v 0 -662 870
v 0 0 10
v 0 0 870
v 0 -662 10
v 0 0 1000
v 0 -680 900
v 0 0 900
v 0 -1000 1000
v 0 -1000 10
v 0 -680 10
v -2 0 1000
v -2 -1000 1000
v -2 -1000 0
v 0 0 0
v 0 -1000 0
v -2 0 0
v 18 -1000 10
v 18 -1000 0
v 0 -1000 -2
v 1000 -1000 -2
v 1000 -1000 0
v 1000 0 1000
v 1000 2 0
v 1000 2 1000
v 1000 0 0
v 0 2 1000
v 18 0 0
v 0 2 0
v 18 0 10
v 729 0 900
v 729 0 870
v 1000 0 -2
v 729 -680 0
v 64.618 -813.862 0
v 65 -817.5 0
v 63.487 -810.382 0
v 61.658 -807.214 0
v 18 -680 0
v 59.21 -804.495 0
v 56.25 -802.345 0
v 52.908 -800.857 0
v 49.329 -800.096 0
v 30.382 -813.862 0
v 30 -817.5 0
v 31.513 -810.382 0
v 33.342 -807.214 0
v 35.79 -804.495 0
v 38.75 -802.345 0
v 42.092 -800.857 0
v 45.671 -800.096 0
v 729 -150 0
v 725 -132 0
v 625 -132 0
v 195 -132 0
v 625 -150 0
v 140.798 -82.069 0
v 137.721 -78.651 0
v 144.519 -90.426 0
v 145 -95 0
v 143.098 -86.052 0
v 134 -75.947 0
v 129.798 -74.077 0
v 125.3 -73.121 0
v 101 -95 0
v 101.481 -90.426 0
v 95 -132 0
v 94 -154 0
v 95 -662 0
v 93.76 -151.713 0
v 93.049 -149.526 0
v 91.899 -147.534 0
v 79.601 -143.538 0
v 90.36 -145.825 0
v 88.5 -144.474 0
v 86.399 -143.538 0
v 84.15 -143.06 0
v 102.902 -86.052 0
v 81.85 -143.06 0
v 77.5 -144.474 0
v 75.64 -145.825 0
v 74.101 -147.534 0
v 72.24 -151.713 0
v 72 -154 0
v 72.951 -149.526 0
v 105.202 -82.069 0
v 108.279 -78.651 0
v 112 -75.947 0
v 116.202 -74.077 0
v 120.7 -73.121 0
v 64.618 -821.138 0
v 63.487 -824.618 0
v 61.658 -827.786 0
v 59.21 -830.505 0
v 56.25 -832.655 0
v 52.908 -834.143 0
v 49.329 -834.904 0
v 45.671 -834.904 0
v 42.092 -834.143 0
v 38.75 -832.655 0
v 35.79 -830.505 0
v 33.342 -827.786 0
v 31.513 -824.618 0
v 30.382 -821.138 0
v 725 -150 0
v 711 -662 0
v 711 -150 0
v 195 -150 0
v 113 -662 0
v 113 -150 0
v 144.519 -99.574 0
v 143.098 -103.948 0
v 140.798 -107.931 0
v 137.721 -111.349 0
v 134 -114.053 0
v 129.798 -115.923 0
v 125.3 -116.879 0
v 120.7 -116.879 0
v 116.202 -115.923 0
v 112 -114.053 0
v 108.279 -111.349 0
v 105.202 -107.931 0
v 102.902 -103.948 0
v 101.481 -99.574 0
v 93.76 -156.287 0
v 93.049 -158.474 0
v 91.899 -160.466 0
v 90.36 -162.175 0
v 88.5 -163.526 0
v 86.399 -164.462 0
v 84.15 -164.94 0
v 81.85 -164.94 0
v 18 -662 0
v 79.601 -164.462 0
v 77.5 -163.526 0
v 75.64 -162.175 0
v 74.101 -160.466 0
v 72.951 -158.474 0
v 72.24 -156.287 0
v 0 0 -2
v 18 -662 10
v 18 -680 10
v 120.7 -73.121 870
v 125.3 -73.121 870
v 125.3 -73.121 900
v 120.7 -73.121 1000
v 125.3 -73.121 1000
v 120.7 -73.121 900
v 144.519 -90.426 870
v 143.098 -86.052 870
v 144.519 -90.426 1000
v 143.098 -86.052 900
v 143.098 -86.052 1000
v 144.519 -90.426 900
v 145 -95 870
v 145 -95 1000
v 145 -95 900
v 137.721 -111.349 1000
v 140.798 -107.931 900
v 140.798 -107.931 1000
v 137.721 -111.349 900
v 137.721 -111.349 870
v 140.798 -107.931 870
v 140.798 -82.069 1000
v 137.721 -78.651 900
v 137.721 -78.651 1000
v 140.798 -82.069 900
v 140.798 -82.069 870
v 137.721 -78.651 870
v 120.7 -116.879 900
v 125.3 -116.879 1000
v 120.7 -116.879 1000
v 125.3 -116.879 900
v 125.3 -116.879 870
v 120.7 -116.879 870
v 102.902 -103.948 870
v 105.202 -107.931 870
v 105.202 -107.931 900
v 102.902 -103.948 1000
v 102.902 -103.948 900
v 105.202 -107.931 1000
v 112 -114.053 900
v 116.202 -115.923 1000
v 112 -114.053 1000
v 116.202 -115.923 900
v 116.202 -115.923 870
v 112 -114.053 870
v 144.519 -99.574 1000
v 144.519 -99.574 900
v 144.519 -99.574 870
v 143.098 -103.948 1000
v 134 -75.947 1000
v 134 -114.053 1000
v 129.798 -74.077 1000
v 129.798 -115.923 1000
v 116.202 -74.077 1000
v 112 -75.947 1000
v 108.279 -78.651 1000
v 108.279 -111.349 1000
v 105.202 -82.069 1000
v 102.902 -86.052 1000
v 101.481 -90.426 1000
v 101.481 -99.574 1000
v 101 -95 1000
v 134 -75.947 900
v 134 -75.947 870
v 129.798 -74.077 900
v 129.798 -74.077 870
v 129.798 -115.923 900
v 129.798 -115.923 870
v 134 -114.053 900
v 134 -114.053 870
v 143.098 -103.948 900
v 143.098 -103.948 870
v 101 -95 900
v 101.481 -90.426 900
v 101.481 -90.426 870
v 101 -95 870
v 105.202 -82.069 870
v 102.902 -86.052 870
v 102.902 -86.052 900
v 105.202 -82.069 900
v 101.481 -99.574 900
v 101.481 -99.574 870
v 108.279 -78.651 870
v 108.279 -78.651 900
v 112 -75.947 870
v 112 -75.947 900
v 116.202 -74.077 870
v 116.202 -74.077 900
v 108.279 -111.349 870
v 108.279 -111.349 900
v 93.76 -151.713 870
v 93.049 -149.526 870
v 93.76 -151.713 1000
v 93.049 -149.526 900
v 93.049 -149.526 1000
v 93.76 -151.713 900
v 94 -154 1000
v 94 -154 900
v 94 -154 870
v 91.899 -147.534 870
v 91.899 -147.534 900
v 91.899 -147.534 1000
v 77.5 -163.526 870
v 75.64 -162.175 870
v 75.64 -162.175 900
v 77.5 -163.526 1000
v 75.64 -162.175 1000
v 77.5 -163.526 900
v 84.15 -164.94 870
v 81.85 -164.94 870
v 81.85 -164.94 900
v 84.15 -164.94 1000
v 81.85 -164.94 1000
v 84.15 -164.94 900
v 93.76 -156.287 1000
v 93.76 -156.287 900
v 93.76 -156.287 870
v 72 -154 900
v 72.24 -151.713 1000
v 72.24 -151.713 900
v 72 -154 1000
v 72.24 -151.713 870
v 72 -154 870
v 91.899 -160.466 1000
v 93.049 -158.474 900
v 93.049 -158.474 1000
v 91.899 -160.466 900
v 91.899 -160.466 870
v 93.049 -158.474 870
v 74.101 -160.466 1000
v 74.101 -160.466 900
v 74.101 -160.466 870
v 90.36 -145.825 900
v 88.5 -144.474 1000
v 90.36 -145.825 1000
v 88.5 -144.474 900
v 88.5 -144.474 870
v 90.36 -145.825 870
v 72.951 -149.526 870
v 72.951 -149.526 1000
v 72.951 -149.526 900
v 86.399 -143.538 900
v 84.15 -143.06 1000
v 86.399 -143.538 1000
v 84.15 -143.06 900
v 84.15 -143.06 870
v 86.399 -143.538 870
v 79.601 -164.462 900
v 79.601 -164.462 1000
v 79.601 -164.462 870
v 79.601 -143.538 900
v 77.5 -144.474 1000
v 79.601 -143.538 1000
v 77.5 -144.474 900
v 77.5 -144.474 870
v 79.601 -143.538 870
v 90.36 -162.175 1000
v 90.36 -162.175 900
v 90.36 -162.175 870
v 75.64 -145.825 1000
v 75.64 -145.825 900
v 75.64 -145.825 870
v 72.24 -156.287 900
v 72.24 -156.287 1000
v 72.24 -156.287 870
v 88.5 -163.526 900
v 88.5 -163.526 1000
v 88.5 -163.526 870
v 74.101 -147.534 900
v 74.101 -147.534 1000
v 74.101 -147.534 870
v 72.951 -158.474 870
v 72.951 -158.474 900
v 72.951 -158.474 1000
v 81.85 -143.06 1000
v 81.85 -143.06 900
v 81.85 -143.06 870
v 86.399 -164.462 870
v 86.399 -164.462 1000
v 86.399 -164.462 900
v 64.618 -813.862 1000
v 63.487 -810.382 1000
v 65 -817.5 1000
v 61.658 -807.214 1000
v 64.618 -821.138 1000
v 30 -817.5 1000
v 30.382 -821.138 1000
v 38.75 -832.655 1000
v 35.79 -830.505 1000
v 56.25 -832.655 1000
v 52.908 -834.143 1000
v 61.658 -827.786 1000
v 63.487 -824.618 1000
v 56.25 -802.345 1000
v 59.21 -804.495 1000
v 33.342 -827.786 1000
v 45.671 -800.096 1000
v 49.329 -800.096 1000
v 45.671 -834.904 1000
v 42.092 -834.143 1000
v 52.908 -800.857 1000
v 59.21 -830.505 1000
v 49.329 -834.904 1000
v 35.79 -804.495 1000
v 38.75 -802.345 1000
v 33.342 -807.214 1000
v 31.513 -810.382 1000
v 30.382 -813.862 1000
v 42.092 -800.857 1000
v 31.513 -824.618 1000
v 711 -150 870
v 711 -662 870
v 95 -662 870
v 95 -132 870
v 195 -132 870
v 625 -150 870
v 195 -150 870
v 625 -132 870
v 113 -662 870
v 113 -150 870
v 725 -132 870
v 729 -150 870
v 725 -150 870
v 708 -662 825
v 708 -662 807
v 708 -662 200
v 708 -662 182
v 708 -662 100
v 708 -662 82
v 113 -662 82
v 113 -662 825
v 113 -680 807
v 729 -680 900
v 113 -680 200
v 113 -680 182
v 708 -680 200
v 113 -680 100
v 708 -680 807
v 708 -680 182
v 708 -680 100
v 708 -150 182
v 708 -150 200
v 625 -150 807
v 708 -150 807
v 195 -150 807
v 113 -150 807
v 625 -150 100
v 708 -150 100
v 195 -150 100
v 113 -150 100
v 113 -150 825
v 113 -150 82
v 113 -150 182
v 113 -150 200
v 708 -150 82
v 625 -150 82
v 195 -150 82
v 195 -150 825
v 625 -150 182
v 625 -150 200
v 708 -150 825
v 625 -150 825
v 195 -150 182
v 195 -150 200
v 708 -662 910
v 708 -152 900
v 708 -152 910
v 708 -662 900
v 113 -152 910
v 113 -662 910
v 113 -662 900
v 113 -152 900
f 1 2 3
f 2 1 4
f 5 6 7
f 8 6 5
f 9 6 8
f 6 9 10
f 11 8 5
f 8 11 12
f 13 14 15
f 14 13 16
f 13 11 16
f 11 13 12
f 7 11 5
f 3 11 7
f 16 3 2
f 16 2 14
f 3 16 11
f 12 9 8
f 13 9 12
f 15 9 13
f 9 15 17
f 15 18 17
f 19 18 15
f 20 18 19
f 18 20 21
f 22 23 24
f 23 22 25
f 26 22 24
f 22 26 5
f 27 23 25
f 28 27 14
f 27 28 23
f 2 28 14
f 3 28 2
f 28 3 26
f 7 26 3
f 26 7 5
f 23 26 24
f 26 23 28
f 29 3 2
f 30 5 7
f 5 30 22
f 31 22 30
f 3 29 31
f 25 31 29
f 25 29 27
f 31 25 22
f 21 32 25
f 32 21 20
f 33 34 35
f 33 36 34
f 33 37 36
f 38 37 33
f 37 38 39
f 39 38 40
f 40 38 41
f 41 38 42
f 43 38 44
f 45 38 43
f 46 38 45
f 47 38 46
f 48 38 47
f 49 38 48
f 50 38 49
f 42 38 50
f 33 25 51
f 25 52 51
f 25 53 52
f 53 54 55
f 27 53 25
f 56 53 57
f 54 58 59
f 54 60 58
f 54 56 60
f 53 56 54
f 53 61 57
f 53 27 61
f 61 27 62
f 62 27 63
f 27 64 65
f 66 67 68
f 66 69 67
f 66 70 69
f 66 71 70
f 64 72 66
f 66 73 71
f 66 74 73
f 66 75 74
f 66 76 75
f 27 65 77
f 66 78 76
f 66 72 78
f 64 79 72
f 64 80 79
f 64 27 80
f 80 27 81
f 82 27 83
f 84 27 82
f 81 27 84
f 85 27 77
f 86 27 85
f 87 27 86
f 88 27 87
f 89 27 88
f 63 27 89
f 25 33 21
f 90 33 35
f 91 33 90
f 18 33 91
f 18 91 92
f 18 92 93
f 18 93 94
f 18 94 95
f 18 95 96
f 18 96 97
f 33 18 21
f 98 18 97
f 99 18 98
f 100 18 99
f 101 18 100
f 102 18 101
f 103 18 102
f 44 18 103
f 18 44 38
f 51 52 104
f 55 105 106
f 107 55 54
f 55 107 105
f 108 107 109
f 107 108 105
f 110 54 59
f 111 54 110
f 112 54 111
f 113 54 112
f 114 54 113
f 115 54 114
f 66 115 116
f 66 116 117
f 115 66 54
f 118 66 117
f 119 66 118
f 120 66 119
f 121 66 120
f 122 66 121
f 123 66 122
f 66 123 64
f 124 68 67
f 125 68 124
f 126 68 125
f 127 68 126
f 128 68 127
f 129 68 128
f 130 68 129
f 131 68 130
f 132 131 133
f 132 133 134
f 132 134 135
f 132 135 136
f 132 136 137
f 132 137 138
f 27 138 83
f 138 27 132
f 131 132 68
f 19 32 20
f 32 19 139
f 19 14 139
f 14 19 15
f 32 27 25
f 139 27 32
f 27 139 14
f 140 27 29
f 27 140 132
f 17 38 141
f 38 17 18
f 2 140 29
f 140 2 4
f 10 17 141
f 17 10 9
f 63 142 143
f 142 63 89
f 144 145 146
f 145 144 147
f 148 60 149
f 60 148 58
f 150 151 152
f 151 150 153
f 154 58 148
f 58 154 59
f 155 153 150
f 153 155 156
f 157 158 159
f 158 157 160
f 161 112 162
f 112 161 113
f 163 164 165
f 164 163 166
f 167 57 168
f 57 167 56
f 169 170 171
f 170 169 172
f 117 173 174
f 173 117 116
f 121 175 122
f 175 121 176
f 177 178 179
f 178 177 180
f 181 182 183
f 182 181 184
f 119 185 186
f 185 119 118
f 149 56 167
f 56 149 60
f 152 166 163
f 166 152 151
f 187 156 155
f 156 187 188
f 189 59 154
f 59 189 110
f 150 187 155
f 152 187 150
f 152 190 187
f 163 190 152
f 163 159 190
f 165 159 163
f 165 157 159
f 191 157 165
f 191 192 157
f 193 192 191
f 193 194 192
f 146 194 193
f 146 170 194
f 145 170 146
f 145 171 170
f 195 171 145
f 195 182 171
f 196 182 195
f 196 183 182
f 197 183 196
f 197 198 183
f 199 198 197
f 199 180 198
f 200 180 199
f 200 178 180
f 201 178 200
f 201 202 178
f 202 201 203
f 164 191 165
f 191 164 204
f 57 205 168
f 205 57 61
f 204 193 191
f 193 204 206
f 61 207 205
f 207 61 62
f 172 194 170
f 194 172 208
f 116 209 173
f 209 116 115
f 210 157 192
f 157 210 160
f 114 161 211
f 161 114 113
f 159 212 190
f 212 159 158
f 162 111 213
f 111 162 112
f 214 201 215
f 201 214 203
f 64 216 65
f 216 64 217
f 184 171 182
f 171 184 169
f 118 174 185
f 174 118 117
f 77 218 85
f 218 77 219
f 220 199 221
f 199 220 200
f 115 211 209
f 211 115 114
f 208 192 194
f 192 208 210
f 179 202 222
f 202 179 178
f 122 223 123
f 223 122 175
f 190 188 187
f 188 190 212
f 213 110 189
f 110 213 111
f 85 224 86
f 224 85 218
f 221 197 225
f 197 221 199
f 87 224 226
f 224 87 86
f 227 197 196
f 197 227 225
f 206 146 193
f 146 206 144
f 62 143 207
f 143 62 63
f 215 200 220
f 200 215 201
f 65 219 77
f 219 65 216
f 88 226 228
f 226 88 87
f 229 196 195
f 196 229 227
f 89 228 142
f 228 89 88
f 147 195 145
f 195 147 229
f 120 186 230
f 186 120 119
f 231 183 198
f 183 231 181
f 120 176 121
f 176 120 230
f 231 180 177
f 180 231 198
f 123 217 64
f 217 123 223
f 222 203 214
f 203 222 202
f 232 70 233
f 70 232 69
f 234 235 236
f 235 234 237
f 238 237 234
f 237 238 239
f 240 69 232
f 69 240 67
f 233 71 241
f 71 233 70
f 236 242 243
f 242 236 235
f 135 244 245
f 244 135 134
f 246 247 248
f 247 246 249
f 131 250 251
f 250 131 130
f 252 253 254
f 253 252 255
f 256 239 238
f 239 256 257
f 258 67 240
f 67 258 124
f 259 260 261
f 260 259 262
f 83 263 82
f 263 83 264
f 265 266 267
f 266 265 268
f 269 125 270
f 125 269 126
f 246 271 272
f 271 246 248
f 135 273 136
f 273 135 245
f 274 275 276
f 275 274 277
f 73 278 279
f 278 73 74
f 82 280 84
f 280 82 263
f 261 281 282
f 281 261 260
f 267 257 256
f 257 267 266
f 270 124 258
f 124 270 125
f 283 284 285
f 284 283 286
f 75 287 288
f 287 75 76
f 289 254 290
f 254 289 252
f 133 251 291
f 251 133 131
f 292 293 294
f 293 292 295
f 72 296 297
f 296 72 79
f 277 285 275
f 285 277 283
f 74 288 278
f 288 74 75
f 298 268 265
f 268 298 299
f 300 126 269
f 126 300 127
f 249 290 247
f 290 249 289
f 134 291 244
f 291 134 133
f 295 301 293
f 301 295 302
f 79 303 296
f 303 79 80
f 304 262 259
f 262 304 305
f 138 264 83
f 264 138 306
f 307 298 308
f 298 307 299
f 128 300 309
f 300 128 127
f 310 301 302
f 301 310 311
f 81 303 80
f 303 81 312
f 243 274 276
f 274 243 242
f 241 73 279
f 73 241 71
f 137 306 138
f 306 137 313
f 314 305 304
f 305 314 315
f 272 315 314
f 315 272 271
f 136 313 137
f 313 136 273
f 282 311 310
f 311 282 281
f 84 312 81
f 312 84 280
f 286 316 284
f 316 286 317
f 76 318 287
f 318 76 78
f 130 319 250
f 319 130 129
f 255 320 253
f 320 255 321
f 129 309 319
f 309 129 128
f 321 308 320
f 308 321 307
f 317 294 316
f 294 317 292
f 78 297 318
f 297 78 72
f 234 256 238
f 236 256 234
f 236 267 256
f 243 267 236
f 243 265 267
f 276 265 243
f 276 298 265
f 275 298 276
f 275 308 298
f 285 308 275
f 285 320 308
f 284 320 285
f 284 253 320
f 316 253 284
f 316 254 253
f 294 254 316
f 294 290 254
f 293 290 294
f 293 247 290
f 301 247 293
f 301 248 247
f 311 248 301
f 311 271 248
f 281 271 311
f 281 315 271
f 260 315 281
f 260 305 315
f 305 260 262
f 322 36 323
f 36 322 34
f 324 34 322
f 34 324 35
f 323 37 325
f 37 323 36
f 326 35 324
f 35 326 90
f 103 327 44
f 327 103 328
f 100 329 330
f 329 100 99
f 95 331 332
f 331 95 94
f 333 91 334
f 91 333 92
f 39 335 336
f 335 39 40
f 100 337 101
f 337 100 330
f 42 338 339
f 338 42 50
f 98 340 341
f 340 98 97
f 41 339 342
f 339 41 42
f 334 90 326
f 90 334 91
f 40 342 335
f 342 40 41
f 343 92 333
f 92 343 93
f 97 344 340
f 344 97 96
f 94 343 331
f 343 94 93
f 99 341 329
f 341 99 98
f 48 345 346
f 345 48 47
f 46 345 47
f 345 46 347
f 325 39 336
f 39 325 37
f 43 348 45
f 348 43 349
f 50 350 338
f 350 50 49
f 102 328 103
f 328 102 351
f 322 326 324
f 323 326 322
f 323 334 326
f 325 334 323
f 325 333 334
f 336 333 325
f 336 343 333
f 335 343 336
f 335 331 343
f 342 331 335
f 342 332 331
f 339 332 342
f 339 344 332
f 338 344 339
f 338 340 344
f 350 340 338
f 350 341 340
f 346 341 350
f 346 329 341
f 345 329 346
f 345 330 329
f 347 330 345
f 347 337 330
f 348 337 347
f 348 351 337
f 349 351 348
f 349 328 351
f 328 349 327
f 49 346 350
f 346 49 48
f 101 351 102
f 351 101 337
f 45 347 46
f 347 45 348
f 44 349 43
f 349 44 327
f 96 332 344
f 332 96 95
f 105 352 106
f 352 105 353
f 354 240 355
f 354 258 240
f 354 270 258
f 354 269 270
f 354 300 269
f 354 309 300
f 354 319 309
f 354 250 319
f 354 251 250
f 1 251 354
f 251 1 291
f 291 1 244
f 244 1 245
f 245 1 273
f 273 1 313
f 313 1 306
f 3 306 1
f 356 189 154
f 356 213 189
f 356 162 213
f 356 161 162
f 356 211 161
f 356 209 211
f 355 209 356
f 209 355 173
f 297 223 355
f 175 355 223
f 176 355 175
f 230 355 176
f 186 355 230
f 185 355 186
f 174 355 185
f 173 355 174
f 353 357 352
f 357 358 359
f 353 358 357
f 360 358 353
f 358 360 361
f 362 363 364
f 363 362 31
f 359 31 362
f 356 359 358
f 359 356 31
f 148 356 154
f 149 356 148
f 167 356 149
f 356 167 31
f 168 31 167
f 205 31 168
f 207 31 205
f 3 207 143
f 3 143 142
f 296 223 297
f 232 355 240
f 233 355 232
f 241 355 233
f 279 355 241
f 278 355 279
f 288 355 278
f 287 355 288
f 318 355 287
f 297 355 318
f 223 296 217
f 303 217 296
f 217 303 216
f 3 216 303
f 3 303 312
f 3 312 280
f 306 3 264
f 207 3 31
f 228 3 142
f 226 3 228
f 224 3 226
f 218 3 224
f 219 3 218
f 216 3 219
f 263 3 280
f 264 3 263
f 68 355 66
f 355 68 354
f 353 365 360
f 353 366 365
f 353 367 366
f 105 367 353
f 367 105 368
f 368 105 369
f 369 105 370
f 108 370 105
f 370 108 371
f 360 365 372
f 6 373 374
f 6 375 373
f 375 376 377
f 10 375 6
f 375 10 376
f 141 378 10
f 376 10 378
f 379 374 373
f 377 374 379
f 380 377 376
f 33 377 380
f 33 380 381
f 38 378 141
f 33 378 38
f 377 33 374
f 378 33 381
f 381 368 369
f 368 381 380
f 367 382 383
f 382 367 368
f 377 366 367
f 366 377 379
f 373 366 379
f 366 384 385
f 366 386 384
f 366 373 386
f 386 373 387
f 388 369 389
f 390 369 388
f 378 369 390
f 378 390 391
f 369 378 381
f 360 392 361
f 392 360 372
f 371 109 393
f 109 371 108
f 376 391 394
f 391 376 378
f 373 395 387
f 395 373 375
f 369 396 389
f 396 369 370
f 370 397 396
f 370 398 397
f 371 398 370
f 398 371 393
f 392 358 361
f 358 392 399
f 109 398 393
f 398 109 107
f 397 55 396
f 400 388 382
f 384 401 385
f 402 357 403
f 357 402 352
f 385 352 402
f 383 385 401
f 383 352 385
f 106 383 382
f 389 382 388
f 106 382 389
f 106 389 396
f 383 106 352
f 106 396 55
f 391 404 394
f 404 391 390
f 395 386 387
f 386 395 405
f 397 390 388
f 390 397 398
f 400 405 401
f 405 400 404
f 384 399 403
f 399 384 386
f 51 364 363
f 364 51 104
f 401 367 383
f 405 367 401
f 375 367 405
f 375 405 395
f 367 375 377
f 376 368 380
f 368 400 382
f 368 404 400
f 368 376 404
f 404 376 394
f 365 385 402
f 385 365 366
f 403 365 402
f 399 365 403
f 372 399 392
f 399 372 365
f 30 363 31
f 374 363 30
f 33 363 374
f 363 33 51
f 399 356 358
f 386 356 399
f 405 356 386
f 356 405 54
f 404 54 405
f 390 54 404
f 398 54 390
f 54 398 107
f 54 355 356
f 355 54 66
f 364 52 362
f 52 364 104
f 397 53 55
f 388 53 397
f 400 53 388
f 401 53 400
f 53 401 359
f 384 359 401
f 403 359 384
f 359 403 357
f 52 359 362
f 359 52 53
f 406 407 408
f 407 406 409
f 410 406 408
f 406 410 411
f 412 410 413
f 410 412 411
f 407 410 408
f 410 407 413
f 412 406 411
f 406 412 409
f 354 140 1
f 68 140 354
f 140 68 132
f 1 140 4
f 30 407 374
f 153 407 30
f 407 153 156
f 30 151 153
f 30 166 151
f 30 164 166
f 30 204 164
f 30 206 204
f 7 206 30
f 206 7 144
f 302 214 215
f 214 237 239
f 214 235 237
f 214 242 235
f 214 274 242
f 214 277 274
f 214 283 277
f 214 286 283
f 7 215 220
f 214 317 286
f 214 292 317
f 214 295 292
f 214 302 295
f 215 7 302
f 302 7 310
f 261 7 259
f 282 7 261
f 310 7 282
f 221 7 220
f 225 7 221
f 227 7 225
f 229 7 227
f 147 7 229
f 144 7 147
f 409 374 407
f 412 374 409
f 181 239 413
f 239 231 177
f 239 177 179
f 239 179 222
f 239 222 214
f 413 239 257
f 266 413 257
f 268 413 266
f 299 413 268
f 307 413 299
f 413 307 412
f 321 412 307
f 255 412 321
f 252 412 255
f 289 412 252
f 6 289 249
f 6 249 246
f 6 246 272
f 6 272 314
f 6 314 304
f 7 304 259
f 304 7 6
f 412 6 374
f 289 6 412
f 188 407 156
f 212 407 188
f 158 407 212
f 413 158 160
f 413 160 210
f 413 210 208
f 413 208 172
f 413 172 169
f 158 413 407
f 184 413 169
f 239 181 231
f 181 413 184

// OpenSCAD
module walls()
{
    size = 1000;
    color([0.5, 0.5, 0.5])
    {      
        translate([-2, -size, 0])
        {
            cube([2, size, size]);
        }
        cube([size, 2, size]);
        translate([0, -size, -2])
        {
            cube([size, size, 2]);
        }
    }
    color([0, 1, 0])
    {
        translate([0, -size, 0])
        {
            cube([18, size, 10]);
        }
    }
}

module pipes()
{
    color([1.0, 0, 0])
    {
        radius = 22;
        translate([(radius + 101), (-radius -73), 0])
        {
            cylinder(h = 1000, r = radius );
        }
        radius2 = 11;
        translate([(radius2 + 72), (-radius2 -143), 0])
        {
            cylinder(h = 1000, r = radius2 );
        }
        
        radius3 = 17.5;
        translate([(radius3 + 30), (-radius3 -800), 0])
        {
            cylinder(h = 1000, r = radius3 );
        }
    }
}

module furniture()
{
    //ezt meg le kell merni
    ySizeOfOven=530;
    zSizeOfOven=870;
    //ez is belerondit az eredeti elkepzelesbe
    yOffsetFromWall=150;
    //530 + 36 + 150 = 716
    offsetFromFloor=100;
    
    //suto meretei
    xSizeOfCooker=595;
    ySizeOfCooker=530;
    zSizeOfCooker=589;
    
    sizeOfDeadArea=95;
    //ebbol le fog jonni a 2 * 18
        sizeOfFrontPanel=711;
  
    
    zSizeOfDrawer=100; 
    zOffsetOfDrawer=zSizeOfDrawer + 18;
    
    translate([0.0, -(ySizeOfOven + yOffsetFromWall), 0.0])
    {
        
        
        //dead area, because of the pipes
        color("#db471a") cube([sizeOfDeadArea, 18, zSizeOfOven]);
        translate([sizeOfDeadArea, 0, 0]) 
        {
            translate([0, 0, 0]) {
                 difference() {
                    color("#75443f") cube([sizeOfFrontPanel - sizeOfDeadArea, 18, zOffsetOfDrawer 
                     + 752]);
                    translate([18, -2, offsetFromFloor]) color("#152fd4") cube([xSizeOfCooker, 30, zOffsetOfDrawer + zSizeOfCooker]);
                }
            }  
            //Elso alja a butornak, innen kezdodik a fiok rendszer
            translate([18, 0, offsetFromFloor - 18]) color("#68db51") cube([xSizeOfCooker, ySizeOfCooker, 18]);
            //Fiok rendszer eleje
            
            translate([18, 0, zSizeOfDrawer + offsetFromFloor - 18]) color("#680b51") cube([xSizeOfCooker, ySizeOfCooker, 18]);
            //Fiok rendszer vege
            translate([18, 0, offsetFromFloor + zSizeOfCooker + zOffsetOfDrawer]) color("#b054d1") cube([xSizeOfCooker, ySizeOfCooker, 18]);
                color("#51c9b7")  cube([18, ySizeOfOven, zSizeOfOven]);
            color("#9e2c56") translate([sizeOfFrontPanel - sizeOfDeadArea, 0, 0]) cube([18, ySizeOfOven, zSizeOfOven]);
            translate([0, ySizeOfOven, 0]) cube([100, 18 , zSizeOfOven]);
            translate([xSizeOfCooker - 65, ySizeOfOven, 0]) cube([100, 18 , zSizeOfOven]);
            
            translate([18, 18, zSizeOfOven]) cube([595, 510, 40]);
        }
            color("#29839e") translate([0,0 , zSizeOfOven]) cube([sizeOfFrontPanel + 18, ySizeOfOven + yOffsetFromWall, 30]);
            
    }
}

walls();
pipes();
furniture();
